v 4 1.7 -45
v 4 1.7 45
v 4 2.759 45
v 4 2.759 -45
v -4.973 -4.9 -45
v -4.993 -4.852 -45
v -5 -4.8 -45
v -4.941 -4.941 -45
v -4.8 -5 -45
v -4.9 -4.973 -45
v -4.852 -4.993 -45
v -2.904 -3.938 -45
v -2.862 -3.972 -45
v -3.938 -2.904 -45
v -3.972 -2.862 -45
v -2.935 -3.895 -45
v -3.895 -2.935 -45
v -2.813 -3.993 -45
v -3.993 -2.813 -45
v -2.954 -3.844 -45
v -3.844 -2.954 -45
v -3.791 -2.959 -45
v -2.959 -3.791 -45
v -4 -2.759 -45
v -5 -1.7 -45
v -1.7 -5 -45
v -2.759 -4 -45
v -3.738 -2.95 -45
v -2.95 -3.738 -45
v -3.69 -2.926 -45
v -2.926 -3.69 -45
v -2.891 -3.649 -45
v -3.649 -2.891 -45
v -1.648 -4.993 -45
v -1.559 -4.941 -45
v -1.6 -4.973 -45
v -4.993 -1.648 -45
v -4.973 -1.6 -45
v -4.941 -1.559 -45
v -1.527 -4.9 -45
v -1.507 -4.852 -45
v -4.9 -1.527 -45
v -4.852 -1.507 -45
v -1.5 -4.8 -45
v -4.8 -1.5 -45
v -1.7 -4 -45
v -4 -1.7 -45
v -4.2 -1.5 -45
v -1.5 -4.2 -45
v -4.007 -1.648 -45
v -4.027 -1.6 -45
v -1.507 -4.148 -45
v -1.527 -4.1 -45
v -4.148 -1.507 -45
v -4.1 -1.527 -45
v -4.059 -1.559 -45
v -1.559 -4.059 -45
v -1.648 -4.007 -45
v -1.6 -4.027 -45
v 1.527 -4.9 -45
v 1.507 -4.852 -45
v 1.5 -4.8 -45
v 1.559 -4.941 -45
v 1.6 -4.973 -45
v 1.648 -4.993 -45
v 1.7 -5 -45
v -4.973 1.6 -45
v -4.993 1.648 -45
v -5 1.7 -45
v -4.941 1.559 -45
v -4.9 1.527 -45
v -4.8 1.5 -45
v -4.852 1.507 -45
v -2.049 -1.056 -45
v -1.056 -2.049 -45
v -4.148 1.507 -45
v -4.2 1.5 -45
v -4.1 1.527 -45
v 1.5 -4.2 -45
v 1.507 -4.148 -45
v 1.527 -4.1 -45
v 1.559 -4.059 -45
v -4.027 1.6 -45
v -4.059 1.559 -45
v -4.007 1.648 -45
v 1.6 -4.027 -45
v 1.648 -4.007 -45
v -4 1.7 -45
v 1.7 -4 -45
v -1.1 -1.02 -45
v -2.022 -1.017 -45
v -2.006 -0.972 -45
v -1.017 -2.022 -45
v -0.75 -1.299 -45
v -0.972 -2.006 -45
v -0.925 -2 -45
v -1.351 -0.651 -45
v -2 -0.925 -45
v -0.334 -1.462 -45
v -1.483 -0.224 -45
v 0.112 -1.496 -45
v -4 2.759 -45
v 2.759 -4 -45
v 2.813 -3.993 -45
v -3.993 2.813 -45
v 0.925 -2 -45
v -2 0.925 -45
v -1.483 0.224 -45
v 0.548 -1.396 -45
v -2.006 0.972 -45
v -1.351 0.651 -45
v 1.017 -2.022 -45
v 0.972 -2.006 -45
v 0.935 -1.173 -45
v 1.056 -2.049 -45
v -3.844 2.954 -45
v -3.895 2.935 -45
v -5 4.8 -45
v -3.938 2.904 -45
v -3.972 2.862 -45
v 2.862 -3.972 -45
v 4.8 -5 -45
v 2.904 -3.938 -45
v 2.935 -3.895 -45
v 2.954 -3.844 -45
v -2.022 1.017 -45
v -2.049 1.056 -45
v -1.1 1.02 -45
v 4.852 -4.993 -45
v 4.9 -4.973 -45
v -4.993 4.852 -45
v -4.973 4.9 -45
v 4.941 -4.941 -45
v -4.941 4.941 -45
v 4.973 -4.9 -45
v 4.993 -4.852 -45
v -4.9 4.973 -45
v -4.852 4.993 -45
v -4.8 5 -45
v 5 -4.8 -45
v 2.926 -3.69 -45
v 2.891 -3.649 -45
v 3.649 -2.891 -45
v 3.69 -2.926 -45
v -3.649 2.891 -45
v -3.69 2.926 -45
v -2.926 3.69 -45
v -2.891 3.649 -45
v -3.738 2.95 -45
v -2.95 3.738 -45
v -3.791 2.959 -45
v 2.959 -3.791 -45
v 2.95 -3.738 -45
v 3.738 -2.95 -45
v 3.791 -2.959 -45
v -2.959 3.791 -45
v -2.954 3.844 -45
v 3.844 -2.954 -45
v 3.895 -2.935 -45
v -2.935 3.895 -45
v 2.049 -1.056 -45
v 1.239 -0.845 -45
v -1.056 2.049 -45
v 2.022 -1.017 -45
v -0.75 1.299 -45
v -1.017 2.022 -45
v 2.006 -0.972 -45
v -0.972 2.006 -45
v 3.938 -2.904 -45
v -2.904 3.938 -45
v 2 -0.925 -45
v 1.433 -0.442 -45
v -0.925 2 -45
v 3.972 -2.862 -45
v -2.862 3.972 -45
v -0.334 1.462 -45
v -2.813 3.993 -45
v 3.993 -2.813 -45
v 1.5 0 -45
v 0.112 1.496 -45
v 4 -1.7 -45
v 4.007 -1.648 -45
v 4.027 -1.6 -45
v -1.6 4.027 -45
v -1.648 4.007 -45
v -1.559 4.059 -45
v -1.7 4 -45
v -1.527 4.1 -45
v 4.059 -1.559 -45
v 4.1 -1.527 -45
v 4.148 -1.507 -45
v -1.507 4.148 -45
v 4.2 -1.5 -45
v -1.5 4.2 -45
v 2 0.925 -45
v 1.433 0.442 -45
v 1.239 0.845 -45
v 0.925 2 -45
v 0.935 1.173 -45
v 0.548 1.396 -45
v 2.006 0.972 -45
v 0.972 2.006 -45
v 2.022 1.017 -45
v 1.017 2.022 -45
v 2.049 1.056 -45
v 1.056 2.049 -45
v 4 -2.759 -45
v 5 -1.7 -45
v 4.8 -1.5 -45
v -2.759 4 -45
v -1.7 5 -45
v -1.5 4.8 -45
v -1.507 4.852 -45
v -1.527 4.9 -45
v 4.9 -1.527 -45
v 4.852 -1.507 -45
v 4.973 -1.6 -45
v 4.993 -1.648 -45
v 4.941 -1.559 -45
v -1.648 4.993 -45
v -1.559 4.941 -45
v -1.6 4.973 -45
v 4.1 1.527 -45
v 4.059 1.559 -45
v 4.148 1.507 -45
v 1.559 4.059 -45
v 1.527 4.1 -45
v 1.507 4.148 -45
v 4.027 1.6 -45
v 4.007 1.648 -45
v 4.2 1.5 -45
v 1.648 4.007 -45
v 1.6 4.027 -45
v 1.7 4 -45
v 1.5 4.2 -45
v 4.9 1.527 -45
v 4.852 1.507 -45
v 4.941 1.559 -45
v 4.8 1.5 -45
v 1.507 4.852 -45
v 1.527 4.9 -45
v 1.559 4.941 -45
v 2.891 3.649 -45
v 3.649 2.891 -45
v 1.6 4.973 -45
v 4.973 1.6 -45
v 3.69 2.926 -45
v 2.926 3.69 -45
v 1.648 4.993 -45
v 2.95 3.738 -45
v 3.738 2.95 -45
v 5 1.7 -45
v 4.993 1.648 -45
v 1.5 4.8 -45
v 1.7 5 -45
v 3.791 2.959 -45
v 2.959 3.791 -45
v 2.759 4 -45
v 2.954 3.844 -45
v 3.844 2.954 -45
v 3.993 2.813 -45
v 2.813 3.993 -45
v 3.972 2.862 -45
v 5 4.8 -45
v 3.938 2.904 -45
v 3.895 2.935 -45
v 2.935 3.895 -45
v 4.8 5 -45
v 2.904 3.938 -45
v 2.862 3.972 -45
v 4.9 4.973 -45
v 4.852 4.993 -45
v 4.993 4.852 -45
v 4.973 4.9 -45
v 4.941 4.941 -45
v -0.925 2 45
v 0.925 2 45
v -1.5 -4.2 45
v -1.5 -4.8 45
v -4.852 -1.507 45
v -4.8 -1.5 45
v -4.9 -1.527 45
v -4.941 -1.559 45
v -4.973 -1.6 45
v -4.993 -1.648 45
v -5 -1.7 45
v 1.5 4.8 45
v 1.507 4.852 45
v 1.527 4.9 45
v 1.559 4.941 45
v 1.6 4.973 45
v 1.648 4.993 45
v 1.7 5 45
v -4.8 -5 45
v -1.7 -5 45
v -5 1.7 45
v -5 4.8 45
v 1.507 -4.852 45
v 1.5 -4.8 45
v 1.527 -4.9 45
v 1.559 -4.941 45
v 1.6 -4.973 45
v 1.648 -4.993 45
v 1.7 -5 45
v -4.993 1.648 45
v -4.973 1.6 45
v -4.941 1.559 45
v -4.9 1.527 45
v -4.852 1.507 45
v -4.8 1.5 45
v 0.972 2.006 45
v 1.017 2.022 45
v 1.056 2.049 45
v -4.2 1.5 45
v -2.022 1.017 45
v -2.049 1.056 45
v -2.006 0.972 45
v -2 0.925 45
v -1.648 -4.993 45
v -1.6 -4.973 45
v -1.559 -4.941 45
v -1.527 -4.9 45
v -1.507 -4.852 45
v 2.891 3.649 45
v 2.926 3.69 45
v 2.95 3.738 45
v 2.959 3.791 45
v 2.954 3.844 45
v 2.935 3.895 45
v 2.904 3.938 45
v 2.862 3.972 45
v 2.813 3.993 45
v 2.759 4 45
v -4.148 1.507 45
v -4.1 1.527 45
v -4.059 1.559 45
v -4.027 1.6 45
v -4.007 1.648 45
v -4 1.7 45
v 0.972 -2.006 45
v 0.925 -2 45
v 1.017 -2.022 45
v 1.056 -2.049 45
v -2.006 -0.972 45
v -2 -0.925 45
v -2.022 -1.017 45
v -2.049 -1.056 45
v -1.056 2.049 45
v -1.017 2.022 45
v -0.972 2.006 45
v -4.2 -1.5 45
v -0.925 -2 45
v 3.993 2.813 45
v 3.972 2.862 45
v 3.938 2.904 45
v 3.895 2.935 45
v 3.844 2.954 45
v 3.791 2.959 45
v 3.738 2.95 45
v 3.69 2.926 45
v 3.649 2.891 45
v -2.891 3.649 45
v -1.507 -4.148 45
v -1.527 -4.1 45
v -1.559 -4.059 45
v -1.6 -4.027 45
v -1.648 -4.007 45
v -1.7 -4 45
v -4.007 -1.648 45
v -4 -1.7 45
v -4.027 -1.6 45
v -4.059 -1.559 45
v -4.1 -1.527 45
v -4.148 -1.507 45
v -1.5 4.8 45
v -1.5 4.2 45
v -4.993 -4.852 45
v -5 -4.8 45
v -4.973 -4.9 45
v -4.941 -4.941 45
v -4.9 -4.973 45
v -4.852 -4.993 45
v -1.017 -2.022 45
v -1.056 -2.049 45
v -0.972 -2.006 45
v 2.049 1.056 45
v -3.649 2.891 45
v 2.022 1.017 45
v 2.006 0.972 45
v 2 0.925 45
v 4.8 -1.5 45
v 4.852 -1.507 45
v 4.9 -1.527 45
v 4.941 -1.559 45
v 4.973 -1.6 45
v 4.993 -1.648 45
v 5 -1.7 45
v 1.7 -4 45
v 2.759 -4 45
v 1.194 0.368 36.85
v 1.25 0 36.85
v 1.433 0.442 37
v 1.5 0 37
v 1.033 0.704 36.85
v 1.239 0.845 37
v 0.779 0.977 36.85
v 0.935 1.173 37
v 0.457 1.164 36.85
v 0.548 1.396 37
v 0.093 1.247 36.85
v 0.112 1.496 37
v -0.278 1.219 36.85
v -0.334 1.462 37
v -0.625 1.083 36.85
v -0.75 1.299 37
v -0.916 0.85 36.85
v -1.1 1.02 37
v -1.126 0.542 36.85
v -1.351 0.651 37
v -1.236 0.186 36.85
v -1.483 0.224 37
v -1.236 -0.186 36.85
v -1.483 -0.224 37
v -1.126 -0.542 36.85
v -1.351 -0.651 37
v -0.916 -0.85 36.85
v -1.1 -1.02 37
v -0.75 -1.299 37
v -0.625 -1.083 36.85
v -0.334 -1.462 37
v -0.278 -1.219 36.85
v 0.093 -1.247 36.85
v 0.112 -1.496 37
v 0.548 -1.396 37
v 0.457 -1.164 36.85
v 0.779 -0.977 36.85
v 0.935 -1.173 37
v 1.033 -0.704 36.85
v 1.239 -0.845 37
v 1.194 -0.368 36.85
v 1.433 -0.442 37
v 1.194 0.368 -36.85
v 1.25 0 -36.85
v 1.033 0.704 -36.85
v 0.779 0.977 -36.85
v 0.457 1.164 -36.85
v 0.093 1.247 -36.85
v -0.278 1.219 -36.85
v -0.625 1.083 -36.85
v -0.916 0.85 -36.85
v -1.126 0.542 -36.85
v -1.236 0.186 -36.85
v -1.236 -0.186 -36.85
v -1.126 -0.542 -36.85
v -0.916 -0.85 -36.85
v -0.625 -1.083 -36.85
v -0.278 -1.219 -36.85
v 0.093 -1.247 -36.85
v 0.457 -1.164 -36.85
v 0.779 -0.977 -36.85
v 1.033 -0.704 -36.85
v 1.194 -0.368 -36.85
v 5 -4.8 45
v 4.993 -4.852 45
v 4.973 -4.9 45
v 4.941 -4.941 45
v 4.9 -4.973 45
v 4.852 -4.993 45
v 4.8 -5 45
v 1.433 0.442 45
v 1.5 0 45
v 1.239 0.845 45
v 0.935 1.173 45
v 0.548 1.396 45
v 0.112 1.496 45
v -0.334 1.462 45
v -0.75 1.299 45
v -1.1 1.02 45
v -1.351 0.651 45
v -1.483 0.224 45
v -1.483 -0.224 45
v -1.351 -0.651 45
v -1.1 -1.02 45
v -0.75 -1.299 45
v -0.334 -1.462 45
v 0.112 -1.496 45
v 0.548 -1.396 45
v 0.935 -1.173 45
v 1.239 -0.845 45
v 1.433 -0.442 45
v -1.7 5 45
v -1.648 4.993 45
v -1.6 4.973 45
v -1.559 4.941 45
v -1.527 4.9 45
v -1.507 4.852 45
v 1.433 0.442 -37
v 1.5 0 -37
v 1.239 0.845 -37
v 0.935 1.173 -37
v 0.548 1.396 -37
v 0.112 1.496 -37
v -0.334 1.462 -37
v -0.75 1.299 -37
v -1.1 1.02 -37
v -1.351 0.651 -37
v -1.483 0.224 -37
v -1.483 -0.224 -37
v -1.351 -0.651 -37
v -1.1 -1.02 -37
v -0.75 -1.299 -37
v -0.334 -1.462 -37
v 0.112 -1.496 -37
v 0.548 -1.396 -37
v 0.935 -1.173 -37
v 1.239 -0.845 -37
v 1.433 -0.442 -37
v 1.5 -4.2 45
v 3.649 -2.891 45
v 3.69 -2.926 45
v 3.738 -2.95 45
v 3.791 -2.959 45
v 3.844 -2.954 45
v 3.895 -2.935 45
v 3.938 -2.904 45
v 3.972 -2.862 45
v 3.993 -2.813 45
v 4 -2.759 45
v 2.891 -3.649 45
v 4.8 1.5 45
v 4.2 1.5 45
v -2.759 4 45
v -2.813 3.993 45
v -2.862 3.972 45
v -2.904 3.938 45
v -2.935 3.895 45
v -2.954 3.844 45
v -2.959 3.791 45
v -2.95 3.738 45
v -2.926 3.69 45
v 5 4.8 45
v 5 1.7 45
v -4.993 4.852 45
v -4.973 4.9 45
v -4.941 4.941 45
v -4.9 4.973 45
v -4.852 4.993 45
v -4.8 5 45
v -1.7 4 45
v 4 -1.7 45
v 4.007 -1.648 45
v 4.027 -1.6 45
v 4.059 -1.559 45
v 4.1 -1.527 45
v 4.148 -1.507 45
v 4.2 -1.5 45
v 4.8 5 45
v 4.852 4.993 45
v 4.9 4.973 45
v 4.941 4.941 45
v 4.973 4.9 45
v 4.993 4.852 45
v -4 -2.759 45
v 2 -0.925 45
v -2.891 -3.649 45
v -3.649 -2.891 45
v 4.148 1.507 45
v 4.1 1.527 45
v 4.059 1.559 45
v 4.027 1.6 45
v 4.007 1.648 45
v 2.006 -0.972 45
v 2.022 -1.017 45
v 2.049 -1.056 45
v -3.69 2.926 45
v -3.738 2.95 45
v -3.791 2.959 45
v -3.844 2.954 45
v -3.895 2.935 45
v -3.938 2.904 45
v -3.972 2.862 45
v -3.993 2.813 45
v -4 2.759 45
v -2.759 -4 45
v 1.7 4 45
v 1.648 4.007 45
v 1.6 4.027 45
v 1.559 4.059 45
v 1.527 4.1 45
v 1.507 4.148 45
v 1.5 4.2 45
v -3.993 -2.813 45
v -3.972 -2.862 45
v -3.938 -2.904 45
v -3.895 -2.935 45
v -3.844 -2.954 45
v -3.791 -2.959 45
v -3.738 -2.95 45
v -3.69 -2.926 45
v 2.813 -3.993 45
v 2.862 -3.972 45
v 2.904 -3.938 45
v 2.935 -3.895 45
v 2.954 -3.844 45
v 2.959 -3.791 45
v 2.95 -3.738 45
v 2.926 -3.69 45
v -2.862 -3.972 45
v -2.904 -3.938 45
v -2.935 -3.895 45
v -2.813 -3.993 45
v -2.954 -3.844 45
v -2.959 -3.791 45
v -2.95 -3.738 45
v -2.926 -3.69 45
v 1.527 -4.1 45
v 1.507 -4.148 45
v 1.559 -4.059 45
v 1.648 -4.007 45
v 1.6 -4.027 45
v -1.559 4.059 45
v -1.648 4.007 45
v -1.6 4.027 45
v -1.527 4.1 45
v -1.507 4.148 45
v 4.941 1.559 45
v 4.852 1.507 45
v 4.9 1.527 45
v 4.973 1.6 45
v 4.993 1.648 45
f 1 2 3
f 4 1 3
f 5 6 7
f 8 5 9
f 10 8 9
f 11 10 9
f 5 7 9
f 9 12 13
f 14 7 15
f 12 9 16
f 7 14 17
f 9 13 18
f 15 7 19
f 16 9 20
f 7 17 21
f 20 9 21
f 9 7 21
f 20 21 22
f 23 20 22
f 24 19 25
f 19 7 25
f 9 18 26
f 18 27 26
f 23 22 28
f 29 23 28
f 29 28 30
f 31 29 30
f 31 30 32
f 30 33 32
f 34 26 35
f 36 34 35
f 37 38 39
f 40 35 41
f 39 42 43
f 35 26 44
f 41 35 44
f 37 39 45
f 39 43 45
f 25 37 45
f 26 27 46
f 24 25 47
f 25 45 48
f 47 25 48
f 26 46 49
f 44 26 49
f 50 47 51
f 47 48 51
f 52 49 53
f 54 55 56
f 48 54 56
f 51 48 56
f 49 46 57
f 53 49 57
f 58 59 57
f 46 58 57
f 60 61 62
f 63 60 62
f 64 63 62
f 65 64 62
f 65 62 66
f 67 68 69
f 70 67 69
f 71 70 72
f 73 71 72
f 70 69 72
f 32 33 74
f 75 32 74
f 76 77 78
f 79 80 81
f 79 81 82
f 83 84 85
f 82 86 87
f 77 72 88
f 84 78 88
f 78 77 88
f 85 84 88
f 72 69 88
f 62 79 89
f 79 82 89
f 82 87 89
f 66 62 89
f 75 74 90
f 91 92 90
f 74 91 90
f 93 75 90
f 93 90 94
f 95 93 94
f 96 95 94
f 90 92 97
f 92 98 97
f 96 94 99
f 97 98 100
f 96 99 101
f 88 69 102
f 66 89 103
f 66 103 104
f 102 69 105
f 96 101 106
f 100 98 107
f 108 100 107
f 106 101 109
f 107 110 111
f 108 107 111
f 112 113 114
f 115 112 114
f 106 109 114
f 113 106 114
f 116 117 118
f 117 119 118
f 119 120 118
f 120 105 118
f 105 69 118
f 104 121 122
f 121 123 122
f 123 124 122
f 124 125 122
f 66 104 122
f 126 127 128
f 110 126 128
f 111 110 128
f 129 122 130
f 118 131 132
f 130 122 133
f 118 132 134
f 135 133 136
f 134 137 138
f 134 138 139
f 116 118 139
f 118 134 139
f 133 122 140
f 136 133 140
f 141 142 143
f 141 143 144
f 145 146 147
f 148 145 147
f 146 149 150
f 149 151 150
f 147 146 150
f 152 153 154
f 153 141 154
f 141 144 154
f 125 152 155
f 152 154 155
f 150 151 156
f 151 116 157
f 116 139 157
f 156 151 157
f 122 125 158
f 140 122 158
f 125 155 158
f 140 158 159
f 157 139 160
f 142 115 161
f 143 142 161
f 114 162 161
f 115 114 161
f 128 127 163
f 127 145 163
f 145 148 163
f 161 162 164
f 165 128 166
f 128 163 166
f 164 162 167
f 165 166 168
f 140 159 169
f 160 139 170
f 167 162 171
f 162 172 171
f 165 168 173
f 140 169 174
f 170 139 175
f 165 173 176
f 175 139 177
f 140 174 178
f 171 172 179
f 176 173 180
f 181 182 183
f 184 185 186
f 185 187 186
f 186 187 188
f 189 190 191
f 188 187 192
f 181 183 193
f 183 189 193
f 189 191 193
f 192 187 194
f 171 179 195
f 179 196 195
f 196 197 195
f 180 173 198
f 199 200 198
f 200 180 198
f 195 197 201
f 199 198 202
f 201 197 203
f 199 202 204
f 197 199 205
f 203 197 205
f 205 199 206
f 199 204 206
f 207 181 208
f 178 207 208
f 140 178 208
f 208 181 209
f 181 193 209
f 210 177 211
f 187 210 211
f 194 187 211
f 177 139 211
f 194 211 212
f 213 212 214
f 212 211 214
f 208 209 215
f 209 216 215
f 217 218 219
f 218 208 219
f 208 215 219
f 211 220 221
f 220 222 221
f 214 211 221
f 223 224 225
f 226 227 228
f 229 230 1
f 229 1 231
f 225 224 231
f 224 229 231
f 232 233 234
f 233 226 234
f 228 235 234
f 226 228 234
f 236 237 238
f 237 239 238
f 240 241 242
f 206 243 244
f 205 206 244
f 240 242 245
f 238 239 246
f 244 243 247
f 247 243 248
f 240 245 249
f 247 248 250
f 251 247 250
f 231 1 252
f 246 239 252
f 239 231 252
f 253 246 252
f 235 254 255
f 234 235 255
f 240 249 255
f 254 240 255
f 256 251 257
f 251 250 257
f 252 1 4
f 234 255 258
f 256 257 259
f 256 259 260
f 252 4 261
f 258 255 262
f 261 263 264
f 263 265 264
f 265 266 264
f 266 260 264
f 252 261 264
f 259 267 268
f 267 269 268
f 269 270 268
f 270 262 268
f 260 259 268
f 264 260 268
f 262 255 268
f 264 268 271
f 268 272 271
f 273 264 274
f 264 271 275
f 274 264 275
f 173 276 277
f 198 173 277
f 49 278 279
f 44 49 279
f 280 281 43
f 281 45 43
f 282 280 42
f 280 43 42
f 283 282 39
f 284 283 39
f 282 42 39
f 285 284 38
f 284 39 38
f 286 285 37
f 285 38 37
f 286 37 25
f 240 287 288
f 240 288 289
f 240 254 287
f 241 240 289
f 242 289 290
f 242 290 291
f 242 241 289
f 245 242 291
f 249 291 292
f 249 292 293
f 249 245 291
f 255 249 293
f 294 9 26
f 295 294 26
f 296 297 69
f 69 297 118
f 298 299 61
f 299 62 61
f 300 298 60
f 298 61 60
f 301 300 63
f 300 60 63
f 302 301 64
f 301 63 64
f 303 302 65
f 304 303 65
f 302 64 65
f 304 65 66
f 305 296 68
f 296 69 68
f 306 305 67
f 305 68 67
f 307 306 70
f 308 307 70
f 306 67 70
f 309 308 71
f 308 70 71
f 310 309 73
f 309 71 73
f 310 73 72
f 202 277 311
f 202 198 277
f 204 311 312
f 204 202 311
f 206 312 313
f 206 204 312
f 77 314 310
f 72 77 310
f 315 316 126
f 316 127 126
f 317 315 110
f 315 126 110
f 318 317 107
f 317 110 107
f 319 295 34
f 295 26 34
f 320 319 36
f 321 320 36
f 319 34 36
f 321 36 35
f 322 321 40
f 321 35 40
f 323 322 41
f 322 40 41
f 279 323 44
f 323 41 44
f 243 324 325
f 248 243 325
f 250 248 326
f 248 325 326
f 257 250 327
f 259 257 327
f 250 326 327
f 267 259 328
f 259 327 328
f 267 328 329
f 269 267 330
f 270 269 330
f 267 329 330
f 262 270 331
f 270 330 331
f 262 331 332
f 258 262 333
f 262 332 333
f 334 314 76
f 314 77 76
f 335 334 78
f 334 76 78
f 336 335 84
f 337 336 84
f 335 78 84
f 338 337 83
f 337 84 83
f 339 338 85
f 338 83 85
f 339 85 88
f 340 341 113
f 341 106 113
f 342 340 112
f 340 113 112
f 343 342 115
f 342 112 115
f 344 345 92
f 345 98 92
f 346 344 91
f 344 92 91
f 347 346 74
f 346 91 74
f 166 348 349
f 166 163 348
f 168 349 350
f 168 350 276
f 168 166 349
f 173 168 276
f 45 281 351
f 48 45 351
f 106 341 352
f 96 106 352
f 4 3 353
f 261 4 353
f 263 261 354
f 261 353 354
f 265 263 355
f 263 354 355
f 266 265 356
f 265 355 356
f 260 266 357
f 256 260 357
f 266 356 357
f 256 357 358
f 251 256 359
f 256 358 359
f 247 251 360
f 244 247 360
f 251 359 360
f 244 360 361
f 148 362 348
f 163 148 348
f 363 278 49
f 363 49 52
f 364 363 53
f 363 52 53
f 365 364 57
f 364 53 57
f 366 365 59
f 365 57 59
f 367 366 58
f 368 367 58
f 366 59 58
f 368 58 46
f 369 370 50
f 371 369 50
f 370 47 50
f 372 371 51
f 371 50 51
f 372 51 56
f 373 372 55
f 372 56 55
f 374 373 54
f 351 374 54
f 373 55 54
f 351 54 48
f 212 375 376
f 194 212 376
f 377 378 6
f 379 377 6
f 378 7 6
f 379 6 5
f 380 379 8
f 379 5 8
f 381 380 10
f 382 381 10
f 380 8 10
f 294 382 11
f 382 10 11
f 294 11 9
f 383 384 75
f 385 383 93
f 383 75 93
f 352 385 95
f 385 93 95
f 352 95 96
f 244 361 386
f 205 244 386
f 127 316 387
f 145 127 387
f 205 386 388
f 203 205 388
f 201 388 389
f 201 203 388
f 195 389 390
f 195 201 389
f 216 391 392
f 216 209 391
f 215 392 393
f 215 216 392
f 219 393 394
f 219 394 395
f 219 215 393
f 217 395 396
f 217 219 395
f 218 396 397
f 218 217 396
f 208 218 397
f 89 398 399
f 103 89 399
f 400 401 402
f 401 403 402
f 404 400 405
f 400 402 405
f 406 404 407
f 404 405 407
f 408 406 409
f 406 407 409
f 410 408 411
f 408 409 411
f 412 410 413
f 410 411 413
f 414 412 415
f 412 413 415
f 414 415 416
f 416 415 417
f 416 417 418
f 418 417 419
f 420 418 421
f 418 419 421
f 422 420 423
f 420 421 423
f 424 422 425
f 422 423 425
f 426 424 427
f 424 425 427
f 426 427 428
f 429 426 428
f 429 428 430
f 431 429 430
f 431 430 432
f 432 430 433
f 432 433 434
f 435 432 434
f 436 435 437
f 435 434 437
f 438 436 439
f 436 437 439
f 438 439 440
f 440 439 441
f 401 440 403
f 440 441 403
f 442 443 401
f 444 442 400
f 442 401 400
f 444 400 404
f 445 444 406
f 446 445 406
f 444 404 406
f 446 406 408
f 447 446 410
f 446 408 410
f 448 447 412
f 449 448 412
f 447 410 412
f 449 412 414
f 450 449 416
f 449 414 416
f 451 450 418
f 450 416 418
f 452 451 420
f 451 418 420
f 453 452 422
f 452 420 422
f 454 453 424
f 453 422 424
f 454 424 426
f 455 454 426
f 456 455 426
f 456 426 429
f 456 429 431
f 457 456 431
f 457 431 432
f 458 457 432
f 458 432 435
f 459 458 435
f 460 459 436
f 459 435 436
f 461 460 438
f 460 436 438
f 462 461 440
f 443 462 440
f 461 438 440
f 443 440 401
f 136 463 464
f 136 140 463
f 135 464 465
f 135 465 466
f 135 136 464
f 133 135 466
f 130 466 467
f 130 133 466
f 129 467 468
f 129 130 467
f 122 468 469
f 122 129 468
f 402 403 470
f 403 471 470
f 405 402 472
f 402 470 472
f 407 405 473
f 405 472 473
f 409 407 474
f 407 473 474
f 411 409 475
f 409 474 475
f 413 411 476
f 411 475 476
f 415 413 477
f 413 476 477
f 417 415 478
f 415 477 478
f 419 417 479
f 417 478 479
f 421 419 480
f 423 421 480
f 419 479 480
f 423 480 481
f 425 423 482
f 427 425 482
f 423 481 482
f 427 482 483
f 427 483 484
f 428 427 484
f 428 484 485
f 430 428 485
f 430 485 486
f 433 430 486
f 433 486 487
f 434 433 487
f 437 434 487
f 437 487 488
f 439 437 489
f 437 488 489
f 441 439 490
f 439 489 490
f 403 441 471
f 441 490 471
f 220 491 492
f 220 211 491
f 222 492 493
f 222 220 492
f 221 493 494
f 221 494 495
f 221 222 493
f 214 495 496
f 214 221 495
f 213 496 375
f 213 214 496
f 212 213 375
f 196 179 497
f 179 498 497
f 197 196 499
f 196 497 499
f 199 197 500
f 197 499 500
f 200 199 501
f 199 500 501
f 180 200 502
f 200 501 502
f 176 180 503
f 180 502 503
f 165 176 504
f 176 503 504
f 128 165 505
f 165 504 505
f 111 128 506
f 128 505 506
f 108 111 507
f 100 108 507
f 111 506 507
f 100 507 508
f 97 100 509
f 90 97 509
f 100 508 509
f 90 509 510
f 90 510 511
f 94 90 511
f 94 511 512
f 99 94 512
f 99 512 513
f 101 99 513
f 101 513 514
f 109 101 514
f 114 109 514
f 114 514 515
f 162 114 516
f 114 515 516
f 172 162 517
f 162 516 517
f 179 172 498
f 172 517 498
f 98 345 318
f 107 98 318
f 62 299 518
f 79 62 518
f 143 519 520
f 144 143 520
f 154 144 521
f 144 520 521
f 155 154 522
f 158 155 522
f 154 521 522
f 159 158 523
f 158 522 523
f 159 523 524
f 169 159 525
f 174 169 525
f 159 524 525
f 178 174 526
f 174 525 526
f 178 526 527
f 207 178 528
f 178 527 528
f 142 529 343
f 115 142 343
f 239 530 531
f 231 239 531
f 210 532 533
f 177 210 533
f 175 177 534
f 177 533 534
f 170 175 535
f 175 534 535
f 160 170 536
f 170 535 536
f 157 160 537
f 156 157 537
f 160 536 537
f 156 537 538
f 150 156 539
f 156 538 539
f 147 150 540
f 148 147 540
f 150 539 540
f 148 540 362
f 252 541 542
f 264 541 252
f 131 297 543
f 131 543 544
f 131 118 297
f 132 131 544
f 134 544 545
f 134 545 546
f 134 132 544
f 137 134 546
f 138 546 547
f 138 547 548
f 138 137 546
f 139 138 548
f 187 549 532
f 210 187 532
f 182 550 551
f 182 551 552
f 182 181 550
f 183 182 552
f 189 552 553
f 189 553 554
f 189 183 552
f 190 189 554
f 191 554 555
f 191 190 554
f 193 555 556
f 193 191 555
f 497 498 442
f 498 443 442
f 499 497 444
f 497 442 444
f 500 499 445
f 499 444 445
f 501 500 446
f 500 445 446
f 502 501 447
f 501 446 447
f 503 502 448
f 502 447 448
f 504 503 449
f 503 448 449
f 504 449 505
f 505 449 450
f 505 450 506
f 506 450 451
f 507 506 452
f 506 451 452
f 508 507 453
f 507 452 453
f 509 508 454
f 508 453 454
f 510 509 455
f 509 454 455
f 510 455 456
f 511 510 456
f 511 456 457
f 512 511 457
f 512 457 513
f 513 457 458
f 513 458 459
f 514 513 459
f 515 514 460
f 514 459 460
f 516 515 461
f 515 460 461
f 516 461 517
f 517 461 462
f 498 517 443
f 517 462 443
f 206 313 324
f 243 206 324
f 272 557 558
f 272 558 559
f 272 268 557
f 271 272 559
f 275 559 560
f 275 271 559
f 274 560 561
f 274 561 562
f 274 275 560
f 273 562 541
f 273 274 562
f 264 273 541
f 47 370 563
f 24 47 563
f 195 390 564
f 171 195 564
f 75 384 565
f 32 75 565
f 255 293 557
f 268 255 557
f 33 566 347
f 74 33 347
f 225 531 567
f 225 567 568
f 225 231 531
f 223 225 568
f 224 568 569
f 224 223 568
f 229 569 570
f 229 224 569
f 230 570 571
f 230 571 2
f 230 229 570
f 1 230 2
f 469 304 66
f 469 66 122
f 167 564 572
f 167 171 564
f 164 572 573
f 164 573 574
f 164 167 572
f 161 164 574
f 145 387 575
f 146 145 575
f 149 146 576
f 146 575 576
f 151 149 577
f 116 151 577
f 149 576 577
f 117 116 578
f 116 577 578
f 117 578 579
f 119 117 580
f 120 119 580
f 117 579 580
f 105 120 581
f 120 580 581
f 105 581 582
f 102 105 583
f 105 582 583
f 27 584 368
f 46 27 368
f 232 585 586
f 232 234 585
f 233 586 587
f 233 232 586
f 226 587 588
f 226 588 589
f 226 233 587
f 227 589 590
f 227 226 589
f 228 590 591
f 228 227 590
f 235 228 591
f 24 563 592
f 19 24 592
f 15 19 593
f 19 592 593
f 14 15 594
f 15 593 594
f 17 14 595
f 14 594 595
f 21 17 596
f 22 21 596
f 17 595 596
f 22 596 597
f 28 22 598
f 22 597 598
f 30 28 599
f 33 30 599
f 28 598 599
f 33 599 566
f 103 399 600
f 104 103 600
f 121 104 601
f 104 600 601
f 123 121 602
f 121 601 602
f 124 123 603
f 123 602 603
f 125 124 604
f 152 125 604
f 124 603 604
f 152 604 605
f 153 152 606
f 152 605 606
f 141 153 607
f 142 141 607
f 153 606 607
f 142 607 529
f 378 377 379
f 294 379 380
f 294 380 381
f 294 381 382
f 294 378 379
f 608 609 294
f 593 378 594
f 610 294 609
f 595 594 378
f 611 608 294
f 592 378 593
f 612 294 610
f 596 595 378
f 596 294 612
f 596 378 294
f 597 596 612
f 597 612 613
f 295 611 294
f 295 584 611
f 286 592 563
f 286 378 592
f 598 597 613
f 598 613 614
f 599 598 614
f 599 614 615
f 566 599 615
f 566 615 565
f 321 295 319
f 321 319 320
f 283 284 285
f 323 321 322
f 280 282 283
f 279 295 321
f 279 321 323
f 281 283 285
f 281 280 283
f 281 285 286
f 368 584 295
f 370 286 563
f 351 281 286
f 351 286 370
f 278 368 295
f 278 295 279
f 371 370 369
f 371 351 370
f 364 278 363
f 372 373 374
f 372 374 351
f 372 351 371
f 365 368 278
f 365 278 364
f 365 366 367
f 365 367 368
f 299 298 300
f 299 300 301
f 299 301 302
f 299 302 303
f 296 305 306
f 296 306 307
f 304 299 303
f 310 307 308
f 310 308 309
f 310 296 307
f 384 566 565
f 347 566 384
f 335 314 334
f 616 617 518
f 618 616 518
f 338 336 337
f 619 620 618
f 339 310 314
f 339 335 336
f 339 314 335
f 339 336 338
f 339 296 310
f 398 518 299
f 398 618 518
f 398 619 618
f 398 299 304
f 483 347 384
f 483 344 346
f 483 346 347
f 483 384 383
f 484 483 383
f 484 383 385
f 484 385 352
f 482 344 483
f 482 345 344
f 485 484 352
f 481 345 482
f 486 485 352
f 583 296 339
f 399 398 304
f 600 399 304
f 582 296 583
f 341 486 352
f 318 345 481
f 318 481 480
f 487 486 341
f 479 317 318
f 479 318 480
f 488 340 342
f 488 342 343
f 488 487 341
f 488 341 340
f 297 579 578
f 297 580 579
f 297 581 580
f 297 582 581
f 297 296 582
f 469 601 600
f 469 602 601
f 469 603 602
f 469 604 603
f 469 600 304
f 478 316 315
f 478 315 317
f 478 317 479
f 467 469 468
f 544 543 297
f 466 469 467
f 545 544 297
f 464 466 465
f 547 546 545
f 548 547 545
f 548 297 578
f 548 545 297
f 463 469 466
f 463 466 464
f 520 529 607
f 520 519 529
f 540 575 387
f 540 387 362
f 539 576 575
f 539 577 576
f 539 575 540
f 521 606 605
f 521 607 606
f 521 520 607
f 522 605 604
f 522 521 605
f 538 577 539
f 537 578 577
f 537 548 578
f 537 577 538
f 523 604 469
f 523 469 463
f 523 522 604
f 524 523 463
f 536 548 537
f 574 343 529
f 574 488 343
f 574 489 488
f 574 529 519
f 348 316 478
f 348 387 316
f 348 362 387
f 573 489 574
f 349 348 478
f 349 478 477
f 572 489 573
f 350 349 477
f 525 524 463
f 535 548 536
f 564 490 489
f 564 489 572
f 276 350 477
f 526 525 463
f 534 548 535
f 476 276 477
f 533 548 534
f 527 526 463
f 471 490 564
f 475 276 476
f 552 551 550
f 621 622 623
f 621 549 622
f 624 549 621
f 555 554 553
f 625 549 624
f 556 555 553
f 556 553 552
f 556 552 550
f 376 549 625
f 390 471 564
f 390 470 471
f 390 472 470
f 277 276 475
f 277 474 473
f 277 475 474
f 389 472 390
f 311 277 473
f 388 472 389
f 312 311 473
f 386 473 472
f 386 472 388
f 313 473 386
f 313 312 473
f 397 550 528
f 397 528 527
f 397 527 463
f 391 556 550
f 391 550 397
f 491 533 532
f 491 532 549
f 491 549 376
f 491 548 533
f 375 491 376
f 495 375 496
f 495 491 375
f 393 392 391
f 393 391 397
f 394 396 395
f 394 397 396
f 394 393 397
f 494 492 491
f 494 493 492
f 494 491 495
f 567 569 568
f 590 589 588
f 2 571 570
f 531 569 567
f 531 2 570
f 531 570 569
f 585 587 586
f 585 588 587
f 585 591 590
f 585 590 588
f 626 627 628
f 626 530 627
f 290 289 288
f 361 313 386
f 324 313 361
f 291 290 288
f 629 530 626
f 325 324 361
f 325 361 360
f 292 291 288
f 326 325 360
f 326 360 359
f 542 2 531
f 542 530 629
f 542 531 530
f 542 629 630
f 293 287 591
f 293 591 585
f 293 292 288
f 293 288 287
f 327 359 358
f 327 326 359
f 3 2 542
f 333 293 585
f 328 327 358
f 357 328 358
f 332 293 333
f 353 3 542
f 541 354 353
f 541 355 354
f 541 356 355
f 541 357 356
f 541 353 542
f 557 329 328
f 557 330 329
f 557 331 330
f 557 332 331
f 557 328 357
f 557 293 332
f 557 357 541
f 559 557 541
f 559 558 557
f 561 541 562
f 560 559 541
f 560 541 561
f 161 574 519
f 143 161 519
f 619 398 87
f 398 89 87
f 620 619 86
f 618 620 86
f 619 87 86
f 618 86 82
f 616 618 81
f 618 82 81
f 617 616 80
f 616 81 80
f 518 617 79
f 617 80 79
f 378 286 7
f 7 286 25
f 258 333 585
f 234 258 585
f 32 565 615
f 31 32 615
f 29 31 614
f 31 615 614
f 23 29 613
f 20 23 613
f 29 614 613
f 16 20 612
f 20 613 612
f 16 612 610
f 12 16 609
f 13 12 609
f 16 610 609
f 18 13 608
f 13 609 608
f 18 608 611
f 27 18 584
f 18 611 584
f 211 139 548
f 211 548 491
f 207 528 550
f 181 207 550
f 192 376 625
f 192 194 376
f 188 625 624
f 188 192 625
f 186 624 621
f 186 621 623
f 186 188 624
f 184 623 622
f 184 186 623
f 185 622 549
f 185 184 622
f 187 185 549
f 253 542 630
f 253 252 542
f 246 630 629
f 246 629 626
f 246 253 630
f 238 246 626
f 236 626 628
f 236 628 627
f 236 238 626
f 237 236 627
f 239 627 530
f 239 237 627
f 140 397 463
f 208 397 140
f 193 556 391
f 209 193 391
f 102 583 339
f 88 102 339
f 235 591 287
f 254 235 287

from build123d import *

# Parameters (mm, degrees)
SKETCH1_W           = 10
SKETCH1_H           = 90
BOSS_EXTRUDE1_DEPTH = 10
CUT_EXTRUDE1_DEPTH  = 91
CUT_EXTRUDE2_DEPTH  = 91
CUT_EXTRUDE3_DEPTH  = 91
CUT_EXTRUDE4_DEPTH  = 91
FILLET1_R           = 0.2


with BuildPart() as part:
    # Sketch1 → Boss-Extrude1 (new body)
    with BuildSketch(Plane(origin=(0, 5, 0), x_dir=(1, 0, 0), z_dir=(0, 1, 0))):
        Rectangle(SKETCH1_W, SKETCH1_H)
    extrude(amount=-BOSS_EXTRUDE1_DEPTH)

    # Sketch2 → Cut-Extrude1 (cut, through all)
    with BuildSketch(Plane.XY.offset(45)):
        with BuildLine():
            Line((5, 1.5), (4, 1.5))
            Line((4, 1.5), (4, 2.759344808))
            ThreePointArc((4, 2.759344808), (3.870199868, 2.946619949), (3.649280215, 2.890811711))
            Line((3.649280215, 2.890811711), (2, 1))
            Line((2, 1), (2, -1))
            Line((2, -1), (3.649280215, -2.890811711))
            ThreePointArc((3.649280215, -2.890811711), (3.870199868, -2.946619949), (4, -2.759344808))
            Line((4, -2.759344808), (4, -1.5))
            Line((4, -1.5), (5, -1.5))
            Line((5, -1.5), (5, 1.5))
        make_face()
    extrude(amount=-CUT_EXTRUDE1_DEPTH, mode=Mode.SUBTRACT)

    # Sketch3 → Cut-Extrude2 (cut, through all)
    with BuildSketch(Plane.XY.offset(45)):
        with BuildLine():
            Line((1.5, -5), (1.5, -4))
            Line((1.5, -4), (2.759344808, -4))
            ThreePointArc((2.759344808, -4), (2.946619949, -3.870199868), (2.890811711, -3.649280215))
            Line((2.890811711, -3.649280215), (1, -2))
            Line((1, -2), (-1, -2))
            Line((-1, -2), (-2.890811711, -3.649280215))
            ThreePointArc((-2.890811711, -3.649280215), (-2.946619949, -3.870199868), (-2.759344808, -4))
            Line((-2.759344808, -4), (-1.5, -4))
            Line((-1.5, -4), (-1.5, -5))
            Line((-1.5, -5), (1.5, -5))
        make_face()
    extrude(amount=-CUT_EXTRUDE2_DEPTH, mode=Mode.SUBTRACT)

    # Sketch4 → Cut-Extrude3 (cut, through all)
    with BuildSketch(Plane.XY.offset(45)):
        with BuildLine():
            Line((-5, -1.5), (-4, -1.5))
            Line((-4, -1.5), (-4, -2.759344808))
            ThreePointArc((-4, -2.759344808), (-3.870199868, -2.946619949), (-3.649280215, -2.890811711))
            Line((-3.649280215, -2.890811711), (-2, -1))
            Line((-2, -1), (-2, 1))
            Line((-2, 1), (-3.649280215, 2.890811711))
            ThreePointArc((-3.649280215, 2.890811711), (-3.870199868, 2.946619949), (-4, 2.759344808))
            Line((-4, 2.759344808), (-4, 1.5))
            Line((-4, 1.5), (-5, 1.5))
            Line((-5, 1.5), (-5, -1.5))
        make_face()
    extrude(amount=-CUT_EXTRUDE3_DEPTH, mode=Mode.SUBTRACT)

    # Sketch5 → Cut-Extrude4 (cut, through all)
    with BuildSketch(Plane.XY.offset(45)):
        with BuildLine():
            Line((-1.5, 5), (-1.5, 4))
            Line((-1.5, 4), (-2.759344808, 4))
            ThreePointArc((-2.759344808, 4), (-2.946619949, 3.870199868), (-2.890811711, 3.649280215))
            Line((-2.890811711, 3.649280215), (-1, 2))
            Line((-1, 2), (1, 2))
            Line((1, 2), (2.890811711, 3.649280215))
            ThreePointArc((2.890811711, 3.649280215), (2.946619949, 3.870199868), (2.759344808, 4))
            Line((2.759344808, 4), (1.5, 4))
            Line((1.5, 4), (1.5, 5))
            Line((1.5, 5), (-1.5, 5))
        make_face()
    extrude(amount=-CUT_EXTRUDE4_DEPTH, mode=Mode.SUBTRACT)

    # Sketch6 → Cut-Revolve1 (revolve, cut)
    with BuildSketch(Plane(origin=(0, 0, 0), x_dir=(1, 0, 0), z_dir=(0, 1, 0))):
        Polygon((1.499999999, 37), (1.25, 36.849784845), (1.25, -36.849784845), (1.499999999, -37), (1.499999999, -45), (0, -45), (0, 45), (1.499999999, 45), align=None)
    revolve(axis=Axis((0, 0, -45), (0, 0, 1)), mode=Mode.SUBTRACT)

    # Fillet1
    fillet1_edges = [part.edges().sort_by_distance(p)[0] for p in [
        (-5, -5, 0),
        (-1.5, 5, 0),
        (1.5, 5, 0),
        (1.5, 4, 0),
        (1, 2, 0),
        (-1, 2, 0),
        (-1.5, 4, 0),
        (5, 1.5, 0),
        (5, -1.5, 0),
        (4, -1.5, 0),
        (2, -1, 0),
        (2, 1, 0),
        (4, 1.5, 0),
        (5, -5, 0),
        (-5, 5, 0),
        (5, 5, 0),
        (1.5, -5, 0),
        (-1.5, -5, 0),
        (-1.5, -4, 0),
        (-1, -2, 0),
        (1, -2, 0),
        (1.5, -4, 0),
        (-5, -1.5, 0),
        (-5, 1.5, 0),
        (-4, 1.5, 0),
        (-2, 1, 0),
        (-2, -1, 0),
        (-4, -1.5, 0),
    ]]
    fillet(fillet1_edges, radius=FILLET1_R)


solid = part.part
